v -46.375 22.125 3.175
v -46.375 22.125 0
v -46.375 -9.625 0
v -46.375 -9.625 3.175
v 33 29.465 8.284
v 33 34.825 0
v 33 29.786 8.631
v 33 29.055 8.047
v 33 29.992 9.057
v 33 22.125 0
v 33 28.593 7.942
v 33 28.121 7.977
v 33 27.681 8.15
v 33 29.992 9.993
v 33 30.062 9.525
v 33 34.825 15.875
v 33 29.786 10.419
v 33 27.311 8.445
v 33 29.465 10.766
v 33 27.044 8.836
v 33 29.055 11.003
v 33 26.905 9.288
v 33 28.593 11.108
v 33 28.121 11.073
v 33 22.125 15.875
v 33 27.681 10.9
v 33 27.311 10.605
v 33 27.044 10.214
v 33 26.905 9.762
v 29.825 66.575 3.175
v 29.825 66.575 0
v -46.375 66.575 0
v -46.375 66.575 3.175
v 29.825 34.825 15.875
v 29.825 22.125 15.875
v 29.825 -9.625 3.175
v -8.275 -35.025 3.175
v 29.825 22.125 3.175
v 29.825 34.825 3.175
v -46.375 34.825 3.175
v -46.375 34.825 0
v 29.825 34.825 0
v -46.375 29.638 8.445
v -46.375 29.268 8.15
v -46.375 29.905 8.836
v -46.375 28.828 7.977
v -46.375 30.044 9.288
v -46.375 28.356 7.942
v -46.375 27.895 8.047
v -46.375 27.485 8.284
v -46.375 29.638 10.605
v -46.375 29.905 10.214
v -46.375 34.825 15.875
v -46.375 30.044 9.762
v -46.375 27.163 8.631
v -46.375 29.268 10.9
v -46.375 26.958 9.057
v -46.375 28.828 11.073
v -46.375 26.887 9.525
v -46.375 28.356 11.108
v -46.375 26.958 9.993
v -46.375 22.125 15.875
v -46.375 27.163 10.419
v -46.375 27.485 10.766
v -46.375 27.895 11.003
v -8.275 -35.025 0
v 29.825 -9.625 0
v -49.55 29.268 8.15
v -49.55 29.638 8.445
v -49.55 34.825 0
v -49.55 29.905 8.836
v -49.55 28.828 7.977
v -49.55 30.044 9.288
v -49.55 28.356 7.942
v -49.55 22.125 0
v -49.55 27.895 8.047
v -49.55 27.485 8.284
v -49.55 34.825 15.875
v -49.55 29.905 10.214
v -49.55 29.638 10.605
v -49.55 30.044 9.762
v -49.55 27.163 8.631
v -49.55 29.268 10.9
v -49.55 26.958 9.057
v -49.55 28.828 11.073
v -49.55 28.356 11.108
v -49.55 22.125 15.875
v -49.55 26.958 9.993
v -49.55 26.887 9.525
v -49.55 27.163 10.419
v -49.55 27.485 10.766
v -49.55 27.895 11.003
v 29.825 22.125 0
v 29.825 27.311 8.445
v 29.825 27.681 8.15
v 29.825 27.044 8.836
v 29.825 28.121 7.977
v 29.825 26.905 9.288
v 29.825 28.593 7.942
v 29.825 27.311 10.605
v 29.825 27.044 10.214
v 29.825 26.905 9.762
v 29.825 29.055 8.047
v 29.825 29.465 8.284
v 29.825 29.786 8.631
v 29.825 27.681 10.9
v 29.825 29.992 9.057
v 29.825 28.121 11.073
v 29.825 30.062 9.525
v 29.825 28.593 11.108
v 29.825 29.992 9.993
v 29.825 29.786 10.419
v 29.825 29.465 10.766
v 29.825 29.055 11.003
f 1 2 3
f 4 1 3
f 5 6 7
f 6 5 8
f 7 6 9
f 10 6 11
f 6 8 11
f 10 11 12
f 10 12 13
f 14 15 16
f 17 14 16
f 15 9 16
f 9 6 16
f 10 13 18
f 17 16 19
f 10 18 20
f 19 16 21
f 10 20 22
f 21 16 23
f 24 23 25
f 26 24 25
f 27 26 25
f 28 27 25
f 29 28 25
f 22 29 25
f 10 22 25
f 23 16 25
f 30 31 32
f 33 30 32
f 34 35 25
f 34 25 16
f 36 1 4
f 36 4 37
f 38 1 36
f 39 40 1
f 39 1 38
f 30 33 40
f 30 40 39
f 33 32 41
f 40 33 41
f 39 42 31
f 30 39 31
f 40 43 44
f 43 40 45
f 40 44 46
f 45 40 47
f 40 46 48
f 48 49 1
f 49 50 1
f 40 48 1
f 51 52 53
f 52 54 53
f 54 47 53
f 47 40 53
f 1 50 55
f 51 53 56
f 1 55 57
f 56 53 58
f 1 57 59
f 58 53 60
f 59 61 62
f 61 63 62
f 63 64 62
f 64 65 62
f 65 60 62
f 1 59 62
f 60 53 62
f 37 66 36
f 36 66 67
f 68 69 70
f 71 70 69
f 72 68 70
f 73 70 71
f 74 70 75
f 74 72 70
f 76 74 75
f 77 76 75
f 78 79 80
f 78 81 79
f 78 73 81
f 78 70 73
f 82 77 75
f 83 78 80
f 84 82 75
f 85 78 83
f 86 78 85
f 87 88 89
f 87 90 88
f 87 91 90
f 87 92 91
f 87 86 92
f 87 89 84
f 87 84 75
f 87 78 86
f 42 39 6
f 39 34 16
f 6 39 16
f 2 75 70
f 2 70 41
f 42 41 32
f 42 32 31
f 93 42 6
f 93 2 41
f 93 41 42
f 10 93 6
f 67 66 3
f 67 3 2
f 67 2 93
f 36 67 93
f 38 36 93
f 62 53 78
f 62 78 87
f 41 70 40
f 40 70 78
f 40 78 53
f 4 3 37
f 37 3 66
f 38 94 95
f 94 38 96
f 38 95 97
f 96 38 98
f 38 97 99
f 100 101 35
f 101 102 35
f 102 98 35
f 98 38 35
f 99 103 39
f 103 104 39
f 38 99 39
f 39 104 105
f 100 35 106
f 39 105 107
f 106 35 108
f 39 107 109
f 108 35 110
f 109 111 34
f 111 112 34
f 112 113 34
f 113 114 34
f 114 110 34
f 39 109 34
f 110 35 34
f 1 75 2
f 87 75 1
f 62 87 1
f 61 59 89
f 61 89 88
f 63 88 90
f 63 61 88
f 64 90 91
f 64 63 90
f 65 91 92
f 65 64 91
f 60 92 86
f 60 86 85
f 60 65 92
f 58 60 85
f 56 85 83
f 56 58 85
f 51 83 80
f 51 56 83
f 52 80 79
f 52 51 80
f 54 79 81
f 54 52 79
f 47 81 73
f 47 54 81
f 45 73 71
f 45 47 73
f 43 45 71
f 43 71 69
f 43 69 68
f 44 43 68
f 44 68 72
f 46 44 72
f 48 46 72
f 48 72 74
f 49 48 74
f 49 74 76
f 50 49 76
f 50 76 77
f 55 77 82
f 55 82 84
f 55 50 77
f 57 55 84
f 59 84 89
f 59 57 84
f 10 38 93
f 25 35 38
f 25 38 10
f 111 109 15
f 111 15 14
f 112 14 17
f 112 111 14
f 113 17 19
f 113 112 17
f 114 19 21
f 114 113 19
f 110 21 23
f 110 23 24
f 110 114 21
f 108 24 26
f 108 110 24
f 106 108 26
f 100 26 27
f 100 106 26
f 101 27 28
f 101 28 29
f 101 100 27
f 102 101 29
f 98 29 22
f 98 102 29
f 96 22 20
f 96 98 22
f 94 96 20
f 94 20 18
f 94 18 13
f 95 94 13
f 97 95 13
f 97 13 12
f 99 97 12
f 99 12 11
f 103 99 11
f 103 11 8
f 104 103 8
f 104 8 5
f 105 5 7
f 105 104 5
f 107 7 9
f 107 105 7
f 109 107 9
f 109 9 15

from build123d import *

# Parameters (mm, degrees)
F1_DEPTH  = 3.175
F2_W      = 12.7
F2_H      = 12.7
F2_R      = 1.5875
F4_DEPTH  = 3.175
F4_FACE_W = 3.175
F4_FACE_H = 12.7
F5_DEPTH  = 3.175
F3_W      = 12.7
F3_H      = 12.7
F3_R      = 1.5875
F6_DEPTH  = 3.175
F6_FACE_W = 3.175
F6_FACE_H = 12.7
F7_DEPTH  = 3.175


with BuildPart() as f1:
    # F0 (on Top) → F1 (new body)
    with BuildSketch(Plane.XY):
        Polygon((29.825334, 66.574713), (-46.374666, 66.574713), (-46.374666, -9.625287), (-8.274666, -35.025287), (29.825334, -9.625287), align=None)
    extrude(amount=F1_DEPTH)



with BuildPart() as f4:
    # F2 (on face) → F4 (new body)
    with BuildSketch(Plane(origin=(-46.374666, 0, 0), x_dir=(0, -1, 0), z_dir=(-1, 0, 0))):
        with Locations((-28.474713, 9.525)):
            Rectangle(F2_W, F2_H)
        with Locations((-28.474713, 9.525)):
            Circle(F2_R, mode=Mode.SUBTRACT)
    extrude(amount=F4_DEPTH)


with BuildPart() as f1_1:
    add(f1.part)

    add(f4.part)  # F5 merges F4
    # F4_face (on face) → F5 (join)
    with BuildSketch(Plane(origin=(-47.962166, 28.474713, 3.175), x_dir=(1, 0, 0), z_dir=(0, 0, -1))):
        Rectangle(F4_FACE_W, F4_FACE_H)
    extrude(amount=F5_DEPTH)



with BuildPart() as f6:
    # F3 (on face) → F6 (new body)
    with BuildSketch(Plane.YZ.offset(29.825334)):
        with Locations((28.474713, 9.525)):
            Rectangle(F3_W, F3_H)
        with Locations((28.474713, 9.525)):
            Circle(F3_R, mode=Mode.SUBTRACT)
    extrude(amount=F6_DEPTH)


with BuildPart() as f1_2:
    add(f1_1.part)

    add(f6.part)  # F7 merges F6
    # F6_face (on face) → F7 (join)
    with BuildSketch(Plane(origin=(31.412834, 28.474713, 3.175), x_dir=(1, 0, 0), z_dir=(0, 0, -1))):
        Rectangle(F6_FACE_W, F6_FACE_H)
    extrude(amount=F7_DEPTH)


solid = f1_2.part
